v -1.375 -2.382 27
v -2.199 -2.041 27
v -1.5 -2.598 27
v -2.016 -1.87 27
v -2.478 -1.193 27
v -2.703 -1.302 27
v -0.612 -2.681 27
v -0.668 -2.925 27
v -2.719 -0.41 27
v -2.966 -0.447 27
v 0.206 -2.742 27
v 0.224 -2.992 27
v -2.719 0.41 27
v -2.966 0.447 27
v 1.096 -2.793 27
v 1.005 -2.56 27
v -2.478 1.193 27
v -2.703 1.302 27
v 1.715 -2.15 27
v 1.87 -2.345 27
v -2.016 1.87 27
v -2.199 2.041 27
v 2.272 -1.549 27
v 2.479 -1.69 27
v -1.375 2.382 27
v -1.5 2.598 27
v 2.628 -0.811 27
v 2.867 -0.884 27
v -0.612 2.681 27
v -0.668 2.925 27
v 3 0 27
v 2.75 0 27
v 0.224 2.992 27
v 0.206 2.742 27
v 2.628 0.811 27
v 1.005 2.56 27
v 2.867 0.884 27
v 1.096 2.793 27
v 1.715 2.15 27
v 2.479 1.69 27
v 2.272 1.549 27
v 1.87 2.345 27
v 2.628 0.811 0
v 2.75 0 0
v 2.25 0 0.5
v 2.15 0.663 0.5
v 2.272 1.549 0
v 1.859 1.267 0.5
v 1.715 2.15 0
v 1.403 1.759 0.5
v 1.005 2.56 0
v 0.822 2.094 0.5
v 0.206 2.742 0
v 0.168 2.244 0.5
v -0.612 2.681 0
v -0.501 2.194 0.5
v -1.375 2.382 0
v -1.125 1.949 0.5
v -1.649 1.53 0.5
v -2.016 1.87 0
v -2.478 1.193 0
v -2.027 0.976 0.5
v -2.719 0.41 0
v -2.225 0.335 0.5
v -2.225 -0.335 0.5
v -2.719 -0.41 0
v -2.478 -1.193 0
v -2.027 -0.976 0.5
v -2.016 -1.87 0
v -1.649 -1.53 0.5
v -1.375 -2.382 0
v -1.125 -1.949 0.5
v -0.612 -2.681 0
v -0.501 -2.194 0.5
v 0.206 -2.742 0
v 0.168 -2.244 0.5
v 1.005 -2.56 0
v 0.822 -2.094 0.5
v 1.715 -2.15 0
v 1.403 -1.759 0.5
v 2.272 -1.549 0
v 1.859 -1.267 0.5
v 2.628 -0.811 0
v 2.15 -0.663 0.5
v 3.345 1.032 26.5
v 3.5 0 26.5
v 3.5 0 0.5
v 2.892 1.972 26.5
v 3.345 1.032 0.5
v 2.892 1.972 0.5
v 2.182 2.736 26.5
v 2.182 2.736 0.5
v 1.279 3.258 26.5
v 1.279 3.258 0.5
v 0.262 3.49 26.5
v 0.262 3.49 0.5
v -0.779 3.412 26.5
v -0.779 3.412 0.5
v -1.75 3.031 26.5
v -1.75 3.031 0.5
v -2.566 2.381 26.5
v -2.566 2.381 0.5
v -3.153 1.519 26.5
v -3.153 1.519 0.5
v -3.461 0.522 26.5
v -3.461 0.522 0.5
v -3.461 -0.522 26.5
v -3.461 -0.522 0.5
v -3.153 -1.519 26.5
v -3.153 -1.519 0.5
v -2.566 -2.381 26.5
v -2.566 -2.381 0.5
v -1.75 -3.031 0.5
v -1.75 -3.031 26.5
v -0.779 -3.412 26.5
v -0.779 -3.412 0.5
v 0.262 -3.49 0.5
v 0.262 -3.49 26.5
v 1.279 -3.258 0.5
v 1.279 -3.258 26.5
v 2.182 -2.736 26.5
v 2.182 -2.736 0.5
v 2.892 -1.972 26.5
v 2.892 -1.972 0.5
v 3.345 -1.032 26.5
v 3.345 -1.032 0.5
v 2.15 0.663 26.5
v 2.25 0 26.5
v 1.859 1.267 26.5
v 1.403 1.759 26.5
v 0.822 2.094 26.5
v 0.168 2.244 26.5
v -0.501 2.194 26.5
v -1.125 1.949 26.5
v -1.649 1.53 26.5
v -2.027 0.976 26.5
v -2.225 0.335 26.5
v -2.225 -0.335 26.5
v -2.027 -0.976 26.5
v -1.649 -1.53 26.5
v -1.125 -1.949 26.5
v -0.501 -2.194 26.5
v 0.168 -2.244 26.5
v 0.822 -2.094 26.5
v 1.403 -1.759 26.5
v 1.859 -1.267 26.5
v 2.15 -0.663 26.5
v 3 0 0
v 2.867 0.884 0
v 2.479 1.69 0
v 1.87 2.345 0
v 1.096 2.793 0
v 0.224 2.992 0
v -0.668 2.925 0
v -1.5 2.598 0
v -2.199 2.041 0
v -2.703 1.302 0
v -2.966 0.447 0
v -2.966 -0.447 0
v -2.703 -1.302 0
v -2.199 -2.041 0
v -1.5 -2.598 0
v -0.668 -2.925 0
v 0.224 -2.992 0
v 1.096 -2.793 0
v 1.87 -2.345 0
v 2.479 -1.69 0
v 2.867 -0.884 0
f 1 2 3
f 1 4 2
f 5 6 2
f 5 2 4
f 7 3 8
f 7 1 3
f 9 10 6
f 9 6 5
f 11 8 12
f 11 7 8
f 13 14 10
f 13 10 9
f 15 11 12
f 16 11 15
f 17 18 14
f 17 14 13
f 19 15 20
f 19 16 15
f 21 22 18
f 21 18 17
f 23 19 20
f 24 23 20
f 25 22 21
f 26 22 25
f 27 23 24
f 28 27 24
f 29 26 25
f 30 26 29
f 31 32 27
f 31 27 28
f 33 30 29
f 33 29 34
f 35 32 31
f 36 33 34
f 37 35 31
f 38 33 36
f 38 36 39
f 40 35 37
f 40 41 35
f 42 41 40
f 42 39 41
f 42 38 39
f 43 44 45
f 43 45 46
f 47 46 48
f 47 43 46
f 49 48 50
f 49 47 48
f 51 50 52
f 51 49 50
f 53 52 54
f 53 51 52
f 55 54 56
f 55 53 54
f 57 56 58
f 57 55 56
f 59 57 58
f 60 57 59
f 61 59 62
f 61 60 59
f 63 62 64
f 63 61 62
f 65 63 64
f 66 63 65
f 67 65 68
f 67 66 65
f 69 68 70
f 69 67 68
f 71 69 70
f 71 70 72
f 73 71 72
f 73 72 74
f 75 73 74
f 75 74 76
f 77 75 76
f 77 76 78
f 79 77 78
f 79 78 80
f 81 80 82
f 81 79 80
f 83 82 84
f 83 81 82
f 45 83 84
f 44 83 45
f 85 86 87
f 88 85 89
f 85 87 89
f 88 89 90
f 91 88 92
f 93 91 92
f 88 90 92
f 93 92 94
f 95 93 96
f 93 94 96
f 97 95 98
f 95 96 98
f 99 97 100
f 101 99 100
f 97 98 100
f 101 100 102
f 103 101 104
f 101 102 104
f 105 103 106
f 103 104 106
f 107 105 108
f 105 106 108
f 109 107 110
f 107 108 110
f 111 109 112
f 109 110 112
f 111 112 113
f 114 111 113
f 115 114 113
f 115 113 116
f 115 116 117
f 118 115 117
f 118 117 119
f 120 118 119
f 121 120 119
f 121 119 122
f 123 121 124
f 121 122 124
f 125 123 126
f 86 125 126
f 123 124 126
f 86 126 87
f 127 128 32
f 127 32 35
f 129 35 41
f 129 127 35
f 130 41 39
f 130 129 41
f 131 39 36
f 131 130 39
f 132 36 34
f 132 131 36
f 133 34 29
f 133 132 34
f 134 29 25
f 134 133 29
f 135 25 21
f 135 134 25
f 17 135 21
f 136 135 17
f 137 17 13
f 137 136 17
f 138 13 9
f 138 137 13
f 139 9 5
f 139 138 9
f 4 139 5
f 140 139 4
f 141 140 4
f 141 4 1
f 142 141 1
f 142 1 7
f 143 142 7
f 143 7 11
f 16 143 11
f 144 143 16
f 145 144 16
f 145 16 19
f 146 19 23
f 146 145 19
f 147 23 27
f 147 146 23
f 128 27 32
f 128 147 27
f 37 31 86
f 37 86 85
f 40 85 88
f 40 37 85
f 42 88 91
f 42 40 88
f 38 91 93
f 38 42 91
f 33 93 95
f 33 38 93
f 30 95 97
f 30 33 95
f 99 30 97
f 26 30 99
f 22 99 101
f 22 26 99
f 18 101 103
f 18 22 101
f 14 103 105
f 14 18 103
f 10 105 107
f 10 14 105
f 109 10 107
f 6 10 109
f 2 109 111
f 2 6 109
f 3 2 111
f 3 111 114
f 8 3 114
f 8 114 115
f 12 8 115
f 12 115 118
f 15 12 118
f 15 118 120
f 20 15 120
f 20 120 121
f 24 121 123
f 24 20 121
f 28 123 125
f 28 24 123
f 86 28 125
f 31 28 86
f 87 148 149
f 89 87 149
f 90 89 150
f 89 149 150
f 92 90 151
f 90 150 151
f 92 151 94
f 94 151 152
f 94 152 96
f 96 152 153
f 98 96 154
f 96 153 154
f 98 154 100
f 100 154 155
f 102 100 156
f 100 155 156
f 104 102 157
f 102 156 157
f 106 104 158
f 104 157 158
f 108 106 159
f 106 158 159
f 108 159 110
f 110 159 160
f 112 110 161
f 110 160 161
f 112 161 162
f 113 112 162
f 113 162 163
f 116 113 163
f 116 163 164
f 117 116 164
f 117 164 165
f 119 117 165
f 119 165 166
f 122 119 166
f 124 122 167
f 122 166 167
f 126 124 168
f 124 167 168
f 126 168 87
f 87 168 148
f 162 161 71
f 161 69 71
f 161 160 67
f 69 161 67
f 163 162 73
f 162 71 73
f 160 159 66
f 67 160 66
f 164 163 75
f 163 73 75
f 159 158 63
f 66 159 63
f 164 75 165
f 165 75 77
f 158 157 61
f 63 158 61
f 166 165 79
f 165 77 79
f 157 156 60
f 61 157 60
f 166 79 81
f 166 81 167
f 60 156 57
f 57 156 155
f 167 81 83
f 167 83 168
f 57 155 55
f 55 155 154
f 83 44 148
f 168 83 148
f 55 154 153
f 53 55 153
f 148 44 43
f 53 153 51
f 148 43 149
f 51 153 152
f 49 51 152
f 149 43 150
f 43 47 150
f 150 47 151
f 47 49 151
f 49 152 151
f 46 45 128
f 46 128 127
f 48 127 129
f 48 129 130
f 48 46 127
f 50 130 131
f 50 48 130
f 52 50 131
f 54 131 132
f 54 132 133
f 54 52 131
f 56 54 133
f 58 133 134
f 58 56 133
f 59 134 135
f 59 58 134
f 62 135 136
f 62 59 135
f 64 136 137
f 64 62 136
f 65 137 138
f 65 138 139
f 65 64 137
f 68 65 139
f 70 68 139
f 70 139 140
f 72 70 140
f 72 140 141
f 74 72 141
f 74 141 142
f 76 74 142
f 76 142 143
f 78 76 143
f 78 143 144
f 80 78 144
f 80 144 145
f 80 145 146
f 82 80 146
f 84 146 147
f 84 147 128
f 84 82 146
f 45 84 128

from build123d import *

# Parameters (mm, degrees)
ESQUISSE1_R        = 3.5
ESQUISSE1_R_2      = 2.25
BOSS_EXTRU_1_DEPTH = 27
CHANFREIN2_SIZE    = 0.5
CHANFREIN3_SIZE    = 0.5


with BuildPart() as part:
    # Esquisse1 → Boss.-Extru.1 (new body)
    with BuildSketch(Plane.XY):
        Circle(ESQUISSE1_R)
        Circle(ESQUISSE1_R_2, mode=Mode.SUBTRACT)
    extrude(amount=BOSS_EXTRU_1_DEPTH)

    # Chanfrein2
    chanfrein2_edges = [part.edges().sort_by_distance(p)[0] for p in [
        (-3.5, 0, 0),
        (-2.25, 0, 0),
    ]]
    chamfer(chanfrein2_edges, length=CHANFREIN2_SIZE)

    # Chanfrein3
    chanfrein3_edges = [part.edges().sort_by_distance(p)[0] for p in [
        (-3.5, 0, 27),
        (-2.25, 0, 27),
    ]]
    chamfer(chanfrein3_edges, length=CHANFREIN3_SIZE)


solid = part.part
